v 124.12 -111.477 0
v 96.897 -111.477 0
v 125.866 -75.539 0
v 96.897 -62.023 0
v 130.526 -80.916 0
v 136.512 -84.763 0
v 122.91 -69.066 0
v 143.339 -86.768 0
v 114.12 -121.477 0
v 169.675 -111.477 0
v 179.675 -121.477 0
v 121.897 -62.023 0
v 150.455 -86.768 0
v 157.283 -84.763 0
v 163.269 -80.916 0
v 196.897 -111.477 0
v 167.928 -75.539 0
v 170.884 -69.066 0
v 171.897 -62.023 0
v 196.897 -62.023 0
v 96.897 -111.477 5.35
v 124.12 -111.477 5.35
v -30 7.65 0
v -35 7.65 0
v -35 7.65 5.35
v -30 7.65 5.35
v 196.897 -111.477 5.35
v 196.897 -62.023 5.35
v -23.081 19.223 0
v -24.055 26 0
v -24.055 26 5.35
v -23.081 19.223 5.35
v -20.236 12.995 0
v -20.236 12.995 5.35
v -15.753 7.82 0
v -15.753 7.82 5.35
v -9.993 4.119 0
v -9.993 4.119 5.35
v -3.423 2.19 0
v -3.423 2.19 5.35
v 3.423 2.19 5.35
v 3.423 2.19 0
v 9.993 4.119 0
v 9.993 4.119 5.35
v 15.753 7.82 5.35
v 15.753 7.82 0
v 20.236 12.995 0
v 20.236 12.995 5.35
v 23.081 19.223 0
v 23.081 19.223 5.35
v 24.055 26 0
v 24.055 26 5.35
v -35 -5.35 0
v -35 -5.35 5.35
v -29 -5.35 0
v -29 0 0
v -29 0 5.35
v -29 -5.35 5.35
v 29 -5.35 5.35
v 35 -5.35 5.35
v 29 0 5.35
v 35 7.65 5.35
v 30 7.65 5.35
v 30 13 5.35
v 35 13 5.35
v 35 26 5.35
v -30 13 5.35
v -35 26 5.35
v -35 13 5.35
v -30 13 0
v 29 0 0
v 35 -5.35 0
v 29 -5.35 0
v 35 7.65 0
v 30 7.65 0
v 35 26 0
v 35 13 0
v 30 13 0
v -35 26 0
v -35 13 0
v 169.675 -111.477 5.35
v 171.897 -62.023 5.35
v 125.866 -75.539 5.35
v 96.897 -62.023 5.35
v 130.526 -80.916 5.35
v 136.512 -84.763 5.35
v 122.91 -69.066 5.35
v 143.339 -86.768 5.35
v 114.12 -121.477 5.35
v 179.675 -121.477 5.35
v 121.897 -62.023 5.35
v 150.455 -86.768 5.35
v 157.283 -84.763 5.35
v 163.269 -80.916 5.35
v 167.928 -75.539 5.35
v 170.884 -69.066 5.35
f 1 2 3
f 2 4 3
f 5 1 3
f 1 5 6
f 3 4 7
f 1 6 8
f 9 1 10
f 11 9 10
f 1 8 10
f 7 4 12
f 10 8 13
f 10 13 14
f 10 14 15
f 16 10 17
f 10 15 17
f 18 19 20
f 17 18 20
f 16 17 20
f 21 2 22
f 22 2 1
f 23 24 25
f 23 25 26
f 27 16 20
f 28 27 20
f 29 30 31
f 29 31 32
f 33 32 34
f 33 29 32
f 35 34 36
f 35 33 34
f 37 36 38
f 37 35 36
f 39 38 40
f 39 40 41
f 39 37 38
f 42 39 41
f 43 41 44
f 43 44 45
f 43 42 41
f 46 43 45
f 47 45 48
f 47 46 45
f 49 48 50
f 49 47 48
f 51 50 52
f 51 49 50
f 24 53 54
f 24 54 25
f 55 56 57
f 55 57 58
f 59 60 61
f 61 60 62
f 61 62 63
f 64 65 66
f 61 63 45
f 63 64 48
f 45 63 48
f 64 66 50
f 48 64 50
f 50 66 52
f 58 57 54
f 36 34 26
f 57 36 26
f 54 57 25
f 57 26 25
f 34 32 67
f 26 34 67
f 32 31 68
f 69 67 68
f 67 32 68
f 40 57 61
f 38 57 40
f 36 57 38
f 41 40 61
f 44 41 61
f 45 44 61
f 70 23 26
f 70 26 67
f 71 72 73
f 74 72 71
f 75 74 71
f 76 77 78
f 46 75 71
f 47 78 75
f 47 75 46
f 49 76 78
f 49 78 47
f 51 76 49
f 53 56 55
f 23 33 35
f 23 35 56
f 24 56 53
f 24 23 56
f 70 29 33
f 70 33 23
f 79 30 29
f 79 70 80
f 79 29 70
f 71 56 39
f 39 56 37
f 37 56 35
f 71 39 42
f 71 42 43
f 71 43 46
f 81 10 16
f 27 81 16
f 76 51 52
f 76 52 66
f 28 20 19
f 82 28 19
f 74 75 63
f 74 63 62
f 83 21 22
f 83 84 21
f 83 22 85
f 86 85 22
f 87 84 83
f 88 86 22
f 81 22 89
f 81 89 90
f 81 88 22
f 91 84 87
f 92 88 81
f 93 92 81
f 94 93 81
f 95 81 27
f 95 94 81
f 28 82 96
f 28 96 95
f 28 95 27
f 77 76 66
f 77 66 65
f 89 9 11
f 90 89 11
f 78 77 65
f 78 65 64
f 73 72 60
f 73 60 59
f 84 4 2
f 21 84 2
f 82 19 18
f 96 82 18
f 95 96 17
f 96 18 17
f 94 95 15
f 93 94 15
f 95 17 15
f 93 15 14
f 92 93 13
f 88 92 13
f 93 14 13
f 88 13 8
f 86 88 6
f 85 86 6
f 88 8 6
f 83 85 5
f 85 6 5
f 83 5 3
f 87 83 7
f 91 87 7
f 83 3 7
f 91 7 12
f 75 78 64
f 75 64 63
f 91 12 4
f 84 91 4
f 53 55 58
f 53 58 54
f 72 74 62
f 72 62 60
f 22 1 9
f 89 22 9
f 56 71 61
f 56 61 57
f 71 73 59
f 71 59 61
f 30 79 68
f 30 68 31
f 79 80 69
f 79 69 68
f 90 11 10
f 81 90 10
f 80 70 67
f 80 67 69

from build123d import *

# Parameters (mm, degrees)
BOSS_EXTRUDE1_DEPTH   = 5.35
BOSS_EXTRUDE1_2_DEPTH = 5.35


with BuildPart() as part:
    # Model → Boss-Extrude1 (new body)
    with BuildSketch(Plane.XY):
        with BuildLine():
            Line((-35, 13), (-35, 26))
            Line((-35, 26), (-24.055, 26))
            ThreePointArc((-24.055, 26), (0, 1.945), (24.055, 26))
            Line((24.055, 26), (35, 26))
            Line((35, 26), (35, 13))
            Line((35, 13), (30, 13))
            Line((30, 13), (30, 7.65))
            Line((30, 7.65), (35, 7.65))
            Line((35, 7.65), (35, -5.317542305))
            Line((35, -5.317542305), (35, -5.35))
            Line((35, -5.35), (29, -5.35))
            Line((29, -5.35), (29, 0))
            Line((29, 0), (-29, 0))
            Line((-29, 0), (-29, -5.35))
            Line((-29, -5.35), (-35, -5.35))
            Line((-35, -5.35), (-35, -5.317542305))
            Line((-35, -5.317542305), (-35, 7.65))
            Line((-35, 7.65), (-30, 7.65))
            Line((-30, 7.65), (-30, 13))
            Line((-30, 13), (-35, 13))
        make_face()
    extrude(amount=BOSS_EXTRUDE1_DEPTH)


with BuildPart() as body_2:
    # Model → Boss-Extrude1 2 (new body)
    with BuildSketch(Plane.XY):
        with BuildLine():
            Line((96.897147823, -111.477215278), (124.119509819, -111.477215278))
            Line((124.119509819, -111.477215278), (114.119509819, -121.477215278))
            Line((114.119509819, -121.477215278), (179.674785827, -121.477215278))
            Line((179.674785827, -121.477215278), (169.674785827, -111.477215278))
            Line((169.674785827, -111.477215278), (196.897147823, -111.477215278))
            Line((196.897147823, -111.477215278), (196.897147823, -62.02269271))
            Line((196.897147823, -62.02269271), (171.897147823, -62.02269271))
            ThreePointArc((171.897147823, -62.02269271), (146.897147823, -87.02269271), (121.897147823, -62.02269271))
            Line((121.897147823, -62.02269271), (96.897147823, -62.02269271))
            Line((96.897147823, -62.02269271), (96.897147823, -111.477215278))
        make_face()
    extrude(amount=BOSS_EXTRUDE1_2_DEPTH)


solid = Compound([part.part, body_2.part])
